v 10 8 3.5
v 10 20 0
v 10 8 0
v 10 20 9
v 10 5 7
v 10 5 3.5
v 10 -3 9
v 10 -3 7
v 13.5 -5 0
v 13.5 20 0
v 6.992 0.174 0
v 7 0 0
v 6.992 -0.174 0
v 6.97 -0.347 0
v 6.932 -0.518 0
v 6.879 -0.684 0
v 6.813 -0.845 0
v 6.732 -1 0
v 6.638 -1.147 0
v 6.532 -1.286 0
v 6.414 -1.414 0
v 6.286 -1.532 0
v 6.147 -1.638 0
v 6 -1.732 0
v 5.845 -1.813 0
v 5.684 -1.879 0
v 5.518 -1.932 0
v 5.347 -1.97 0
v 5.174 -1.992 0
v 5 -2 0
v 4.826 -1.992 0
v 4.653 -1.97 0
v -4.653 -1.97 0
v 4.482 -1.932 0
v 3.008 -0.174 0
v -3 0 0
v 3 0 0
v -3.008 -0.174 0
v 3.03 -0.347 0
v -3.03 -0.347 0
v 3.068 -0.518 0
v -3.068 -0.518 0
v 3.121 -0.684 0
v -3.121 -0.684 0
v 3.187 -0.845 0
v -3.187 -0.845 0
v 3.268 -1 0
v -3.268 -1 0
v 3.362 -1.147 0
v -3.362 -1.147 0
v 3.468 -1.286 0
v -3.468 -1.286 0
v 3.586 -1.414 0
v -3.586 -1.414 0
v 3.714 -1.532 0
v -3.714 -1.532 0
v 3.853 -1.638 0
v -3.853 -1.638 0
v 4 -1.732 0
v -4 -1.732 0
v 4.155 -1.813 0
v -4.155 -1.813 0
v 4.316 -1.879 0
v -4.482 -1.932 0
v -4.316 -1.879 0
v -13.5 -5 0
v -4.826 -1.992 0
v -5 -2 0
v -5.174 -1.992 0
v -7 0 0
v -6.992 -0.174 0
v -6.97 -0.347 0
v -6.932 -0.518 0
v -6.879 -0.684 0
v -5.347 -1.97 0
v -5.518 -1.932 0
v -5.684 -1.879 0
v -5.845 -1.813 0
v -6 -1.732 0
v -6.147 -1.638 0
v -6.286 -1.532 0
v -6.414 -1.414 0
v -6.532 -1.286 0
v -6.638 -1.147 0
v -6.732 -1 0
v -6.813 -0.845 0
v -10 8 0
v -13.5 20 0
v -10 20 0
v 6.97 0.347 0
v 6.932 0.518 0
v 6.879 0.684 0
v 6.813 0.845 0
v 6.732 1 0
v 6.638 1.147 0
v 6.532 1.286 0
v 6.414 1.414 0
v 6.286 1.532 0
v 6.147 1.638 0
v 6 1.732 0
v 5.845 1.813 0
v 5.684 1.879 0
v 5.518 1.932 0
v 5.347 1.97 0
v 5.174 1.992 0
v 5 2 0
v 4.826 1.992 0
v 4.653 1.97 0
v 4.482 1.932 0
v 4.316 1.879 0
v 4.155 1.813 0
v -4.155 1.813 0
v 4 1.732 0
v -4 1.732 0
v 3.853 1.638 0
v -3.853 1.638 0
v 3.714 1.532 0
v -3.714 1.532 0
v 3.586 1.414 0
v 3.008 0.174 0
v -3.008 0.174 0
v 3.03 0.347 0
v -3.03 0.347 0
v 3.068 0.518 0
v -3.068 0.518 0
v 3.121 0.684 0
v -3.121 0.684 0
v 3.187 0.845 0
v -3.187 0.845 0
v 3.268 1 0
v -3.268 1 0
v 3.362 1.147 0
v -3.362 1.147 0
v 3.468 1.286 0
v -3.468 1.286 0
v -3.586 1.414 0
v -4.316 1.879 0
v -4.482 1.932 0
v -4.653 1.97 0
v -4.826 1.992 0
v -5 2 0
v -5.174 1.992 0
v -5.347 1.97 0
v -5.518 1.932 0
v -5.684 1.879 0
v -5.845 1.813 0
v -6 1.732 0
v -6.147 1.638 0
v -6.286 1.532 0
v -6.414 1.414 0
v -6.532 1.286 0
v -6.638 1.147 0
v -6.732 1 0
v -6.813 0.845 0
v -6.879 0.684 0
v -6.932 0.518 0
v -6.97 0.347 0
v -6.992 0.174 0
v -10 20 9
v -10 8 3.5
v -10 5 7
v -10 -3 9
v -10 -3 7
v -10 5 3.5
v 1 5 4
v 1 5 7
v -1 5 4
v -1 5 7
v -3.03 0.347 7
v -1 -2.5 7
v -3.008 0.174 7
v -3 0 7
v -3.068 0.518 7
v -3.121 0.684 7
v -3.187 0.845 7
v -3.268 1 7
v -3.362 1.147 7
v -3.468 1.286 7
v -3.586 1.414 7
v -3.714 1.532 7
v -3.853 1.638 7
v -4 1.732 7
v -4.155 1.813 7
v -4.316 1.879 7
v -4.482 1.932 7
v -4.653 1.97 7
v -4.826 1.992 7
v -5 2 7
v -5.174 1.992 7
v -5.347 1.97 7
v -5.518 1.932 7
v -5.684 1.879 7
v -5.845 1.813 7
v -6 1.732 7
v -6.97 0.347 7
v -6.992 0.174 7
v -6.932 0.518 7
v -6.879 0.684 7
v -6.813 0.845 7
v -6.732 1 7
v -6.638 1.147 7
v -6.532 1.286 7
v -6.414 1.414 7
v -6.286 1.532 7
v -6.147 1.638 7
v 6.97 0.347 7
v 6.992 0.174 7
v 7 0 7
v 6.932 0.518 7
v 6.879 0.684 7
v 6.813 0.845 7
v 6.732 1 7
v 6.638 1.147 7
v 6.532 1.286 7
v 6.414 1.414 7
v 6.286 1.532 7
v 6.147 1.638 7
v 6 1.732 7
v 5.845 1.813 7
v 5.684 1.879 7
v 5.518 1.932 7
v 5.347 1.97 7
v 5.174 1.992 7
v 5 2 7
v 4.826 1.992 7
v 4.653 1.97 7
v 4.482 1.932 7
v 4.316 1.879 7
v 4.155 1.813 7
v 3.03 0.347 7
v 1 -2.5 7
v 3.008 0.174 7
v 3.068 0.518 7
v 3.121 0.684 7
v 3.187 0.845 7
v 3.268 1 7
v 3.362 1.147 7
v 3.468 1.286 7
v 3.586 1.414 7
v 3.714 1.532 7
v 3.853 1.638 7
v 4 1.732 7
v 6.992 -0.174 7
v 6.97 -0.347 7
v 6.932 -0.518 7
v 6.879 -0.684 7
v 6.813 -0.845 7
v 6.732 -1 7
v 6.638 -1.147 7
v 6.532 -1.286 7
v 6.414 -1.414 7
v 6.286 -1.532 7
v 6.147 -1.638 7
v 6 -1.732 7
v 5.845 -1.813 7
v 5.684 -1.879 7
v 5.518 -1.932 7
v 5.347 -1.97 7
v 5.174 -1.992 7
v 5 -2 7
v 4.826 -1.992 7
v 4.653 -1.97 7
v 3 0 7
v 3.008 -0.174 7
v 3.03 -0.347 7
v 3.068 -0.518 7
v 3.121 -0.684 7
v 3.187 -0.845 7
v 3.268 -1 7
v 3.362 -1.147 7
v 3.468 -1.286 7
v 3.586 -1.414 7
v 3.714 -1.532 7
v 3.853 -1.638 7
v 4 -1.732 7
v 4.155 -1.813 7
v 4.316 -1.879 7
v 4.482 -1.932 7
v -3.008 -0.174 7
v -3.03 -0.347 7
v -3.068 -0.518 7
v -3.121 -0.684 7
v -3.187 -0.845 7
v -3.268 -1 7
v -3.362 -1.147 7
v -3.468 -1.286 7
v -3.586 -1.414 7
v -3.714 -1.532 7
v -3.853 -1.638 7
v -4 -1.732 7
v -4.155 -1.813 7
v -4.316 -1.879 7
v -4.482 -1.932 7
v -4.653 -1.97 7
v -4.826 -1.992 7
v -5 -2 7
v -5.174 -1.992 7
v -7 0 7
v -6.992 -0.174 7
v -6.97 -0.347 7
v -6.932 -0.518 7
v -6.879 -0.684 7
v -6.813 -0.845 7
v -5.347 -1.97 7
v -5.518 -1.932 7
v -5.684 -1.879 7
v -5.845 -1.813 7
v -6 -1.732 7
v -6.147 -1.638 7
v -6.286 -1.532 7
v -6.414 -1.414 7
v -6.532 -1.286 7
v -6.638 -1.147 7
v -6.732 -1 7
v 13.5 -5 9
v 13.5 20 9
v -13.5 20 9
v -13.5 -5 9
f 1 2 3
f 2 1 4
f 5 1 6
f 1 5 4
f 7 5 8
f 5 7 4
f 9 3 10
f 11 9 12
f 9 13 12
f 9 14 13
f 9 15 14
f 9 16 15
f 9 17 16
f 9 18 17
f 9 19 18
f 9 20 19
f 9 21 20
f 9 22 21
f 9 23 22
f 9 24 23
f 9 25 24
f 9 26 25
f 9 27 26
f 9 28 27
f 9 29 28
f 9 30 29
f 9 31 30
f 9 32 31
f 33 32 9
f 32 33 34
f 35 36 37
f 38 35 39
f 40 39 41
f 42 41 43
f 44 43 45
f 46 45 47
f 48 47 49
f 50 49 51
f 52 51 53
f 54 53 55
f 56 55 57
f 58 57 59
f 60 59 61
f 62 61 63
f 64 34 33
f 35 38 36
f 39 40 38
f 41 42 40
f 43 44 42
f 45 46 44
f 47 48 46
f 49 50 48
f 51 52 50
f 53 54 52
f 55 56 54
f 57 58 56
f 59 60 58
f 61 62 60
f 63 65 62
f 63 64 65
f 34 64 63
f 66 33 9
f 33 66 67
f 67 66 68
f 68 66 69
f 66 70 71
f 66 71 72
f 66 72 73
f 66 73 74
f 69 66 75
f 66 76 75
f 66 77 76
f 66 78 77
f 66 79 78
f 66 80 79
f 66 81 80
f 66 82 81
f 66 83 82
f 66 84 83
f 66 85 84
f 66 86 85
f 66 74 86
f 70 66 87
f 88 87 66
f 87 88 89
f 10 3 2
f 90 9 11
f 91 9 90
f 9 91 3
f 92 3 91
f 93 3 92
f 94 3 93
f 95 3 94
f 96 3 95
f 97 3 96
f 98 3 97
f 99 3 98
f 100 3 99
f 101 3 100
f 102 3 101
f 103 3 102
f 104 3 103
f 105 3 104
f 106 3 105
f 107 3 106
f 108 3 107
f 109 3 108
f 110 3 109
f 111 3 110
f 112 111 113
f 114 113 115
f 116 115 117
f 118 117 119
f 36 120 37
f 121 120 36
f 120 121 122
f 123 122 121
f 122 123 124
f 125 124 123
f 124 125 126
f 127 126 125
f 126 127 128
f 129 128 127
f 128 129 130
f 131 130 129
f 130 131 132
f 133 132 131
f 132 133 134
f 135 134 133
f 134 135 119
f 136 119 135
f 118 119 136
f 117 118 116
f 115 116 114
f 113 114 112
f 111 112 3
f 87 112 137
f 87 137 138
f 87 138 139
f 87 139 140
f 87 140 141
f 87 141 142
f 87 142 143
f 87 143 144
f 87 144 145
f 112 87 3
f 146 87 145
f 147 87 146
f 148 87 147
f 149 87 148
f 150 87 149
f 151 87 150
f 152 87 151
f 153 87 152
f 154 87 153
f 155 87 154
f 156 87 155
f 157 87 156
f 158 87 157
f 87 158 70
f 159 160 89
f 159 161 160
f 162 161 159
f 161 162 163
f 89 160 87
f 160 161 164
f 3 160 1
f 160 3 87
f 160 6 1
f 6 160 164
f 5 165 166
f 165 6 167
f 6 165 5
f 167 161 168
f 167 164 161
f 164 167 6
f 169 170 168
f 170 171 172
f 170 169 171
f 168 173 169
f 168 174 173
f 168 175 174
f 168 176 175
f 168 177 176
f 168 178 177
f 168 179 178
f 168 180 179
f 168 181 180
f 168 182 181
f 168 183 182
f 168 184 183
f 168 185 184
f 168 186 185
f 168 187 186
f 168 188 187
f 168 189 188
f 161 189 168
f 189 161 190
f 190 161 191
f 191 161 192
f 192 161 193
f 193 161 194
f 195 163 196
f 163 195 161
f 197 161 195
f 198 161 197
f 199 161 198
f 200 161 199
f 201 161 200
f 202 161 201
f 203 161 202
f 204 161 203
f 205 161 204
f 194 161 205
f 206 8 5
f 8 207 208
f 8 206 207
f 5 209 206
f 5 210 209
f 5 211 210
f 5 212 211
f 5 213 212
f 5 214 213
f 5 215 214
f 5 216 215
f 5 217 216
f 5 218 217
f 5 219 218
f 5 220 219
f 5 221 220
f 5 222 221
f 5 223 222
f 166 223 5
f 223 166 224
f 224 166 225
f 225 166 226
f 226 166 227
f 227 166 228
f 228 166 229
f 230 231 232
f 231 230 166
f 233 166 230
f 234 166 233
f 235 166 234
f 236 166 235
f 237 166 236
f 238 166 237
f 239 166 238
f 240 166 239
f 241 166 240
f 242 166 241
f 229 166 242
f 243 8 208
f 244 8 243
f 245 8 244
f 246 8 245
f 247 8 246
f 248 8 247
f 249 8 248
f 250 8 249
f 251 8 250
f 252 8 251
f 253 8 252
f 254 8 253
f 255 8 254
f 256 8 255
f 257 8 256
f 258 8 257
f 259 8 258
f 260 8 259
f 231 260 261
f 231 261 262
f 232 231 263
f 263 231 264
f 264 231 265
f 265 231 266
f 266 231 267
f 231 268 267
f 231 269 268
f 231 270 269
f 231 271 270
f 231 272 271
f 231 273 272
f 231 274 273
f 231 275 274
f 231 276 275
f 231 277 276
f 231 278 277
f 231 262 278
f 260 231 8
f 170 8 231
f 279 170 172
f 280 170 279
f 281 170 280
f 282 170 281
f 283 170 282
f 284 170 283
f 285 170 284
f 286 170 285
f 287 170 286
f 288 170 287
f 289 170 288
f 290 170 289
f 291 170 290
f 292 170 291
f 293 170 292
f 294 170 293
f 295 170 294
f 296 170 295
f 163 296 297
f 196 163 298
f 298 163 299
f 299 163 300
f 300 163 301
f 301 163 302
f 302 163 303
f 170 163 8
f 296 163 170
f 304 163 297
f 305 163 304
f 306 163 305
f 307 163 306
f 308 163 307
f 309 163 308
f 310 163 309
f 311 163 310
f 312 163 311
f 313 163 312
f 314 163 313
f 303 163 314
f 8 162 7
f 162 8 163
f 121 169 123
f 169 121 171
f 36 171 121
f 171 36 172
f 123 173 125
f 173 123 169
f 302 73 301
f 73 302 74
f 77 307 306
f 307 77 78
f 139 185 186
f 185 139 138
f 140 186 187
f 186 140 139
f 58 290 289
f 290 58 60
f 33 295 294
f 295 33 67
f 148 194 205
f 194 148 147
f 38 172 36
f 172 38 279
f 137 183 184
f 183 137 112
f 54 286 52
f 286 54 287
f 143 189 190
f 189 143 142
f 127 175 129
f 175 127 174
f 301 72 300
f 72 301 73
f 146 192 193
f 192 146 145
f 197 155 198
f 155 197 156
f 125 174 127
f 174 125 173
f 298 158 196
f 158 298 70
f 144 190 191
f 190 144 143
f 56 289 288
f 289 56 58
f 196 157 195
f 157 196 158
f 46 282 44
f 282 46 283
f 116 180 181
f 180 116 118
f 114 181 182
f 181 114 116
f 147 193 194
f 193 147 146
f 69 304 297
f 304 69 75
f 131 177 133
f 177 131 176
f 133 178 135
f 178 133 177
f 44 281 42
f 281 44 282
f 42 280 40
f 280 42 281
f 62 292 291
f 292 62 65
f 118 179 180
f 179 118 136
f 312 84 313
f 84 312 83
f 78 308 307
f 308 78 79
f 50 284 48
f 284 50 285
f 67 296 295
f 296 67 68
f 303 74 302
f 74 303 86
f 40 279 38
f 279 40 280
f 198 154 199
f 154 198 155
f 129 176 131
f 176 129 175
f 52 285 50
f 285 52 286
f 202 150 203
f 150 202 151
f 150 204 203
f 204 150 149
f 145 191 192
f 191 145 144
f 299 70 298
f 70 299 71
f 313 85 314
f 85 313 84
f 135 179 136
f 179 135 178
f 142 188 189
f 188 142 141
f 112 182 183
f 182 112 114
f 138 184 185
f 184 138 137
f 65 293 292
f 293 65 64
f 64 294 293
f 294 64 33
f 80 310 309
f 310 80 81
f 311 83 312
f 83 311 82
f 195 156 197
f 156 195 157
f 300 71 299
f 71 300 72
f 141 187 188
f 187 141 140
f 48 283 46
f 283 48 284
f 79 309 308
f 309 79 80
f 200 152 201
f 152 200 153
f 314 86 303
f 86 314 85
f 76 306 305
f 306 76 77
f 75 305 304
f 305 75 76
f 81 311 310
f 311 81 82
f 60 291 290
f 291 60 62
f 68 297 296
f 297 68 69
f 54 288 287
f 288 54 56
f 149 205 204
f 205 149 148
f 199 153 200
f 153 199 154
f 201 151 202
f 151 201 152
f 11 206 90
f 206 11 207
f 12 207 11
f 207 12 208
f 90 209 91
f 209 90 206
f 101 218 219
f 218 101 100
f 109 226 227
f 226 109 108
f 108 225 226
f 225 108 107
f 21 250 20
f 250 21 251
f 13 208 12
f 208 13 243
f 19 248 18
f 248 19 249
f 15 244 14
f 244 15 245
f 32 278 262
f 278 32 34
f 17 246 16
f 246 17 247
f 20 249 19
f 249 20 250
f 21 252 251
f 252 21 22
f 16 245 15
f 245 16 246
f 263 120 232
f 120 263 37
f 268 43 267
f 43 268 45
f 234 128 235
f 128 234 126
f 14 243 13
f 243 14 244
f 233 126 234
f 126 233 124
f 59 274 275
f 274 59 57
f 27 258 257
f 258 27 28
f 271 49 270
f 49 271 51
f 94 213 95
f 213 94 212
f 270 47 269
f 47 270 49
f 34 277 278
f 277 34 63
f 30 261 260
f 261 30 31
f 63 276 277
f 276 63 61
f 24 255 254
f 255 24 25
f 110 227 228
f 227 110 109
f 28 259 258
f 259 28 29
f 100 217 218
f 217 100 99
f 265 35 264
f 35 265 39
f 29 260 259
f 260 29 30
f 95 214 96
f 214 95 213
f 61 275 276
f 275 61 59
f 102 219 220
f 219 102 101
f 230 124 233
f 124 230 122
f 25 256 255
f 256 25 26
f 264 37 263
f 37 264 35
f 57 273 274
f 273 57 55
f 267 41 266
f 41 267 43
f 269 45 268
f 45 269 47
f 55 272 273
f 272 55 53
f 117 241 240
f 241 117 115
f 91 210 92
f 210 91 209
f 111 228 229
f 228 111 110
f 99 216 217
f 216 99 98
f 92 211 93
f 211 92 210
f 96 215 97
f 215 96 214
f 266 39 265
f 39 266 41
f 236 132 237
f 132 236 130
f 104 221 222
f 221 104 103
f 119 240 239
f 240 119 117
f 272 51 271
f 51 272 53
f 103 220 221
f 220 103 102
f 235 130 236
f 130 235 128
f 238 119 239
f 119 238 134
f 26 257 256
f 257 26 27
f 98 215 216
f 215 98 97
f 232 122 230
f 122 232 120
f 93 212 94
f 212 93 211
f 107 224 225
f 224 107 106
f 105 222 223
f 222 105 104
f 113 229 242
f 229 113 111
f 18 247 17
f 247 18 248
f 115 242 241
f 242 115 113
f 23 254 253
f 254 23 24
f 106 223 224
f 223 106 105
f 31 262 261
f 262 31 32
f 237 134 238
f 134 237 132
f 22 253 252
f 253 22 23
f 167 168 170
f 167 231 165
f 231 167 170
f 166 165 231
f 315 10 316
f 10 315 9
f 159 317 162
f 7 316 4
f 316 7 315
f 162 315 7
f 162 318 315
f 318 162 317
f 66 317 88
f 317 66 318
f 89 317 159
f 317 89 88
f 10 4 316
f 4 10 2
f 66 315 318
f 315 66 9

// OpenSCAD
HolderOffset = 5;
HolderWidth = 27;
HolderLength = 20;
HolderHeight = 9;


HoleRadius = 2;
$fn = 72;

ServoWidth = 20;
ServoBaseOffset=8;
ServoBaseLength=36;
ServoBaseThickness = 3.5;

ServoMiddleOffset=5;
ServoMiddleLength=38;
ServoMiddleThickness = 3.5;
ServoBodyHeight = 43;

ServoPlateOffset = 3;
ServoPlateLength=48;
ServoPlateThickness = 3;

FarScrewOffset=48;

WedgeX = 2.5;
WedgeY = 3;

//Servo();



difference() {
    translate([-HolderWidth/2,-HolderOffset,0])
        cube([HolderWidth,HolderOffset+HolderLength,HolderHeight]);
    Servo();
}

module Servo() {
    union () {
        translate([-ServoWidth/2,ServoBaseOffset, 0])
        cube([ServoWidth,ServoBaseLength,ServoBaseThickness+1]);

        translate([-ServoWidth/2,ServoMiddleOffset, ServoBaseThickness])
        cube([ServoWidth,ServoMiddleLength,ServoBodyHeight]);

        translate([-ServoWidth/2,-ServoPlateOffset,ServoBaseThickness+ServoMiddleThickness])
        cube([ServoWidth,ServoPlateLength+ServoPlateOffset*2,
              ServoBodyHeight]);
        
        translate([-5,0,0])
            cylinder(r=2,h=ServoBodyHeight);
        translate([5,0,0])
            cylinder(r=2,h=ServoBodyHeight);
        translate([-5,FarScrewOffset,0])
            cylinder(r=2,h=ServoBodyHeight);
        translate([5,FarScrewOffset,0])
            cylinder(r=2,h=ServoBodyHeight);
        translate([0,0,ServoBaseThickness+ServoMiddleThickness])
            rotate([0,90,0])
                translate([0,0,-1])
                    linear_extrude(height=2)
                    polygon([[0,-WedgeX],
                             [WedgeY,ServoMiddleOffset],
                             [0,5]]);
        translate([0,ServoMiddleLength+10,ServoBaseThickness+ServoMiddleThickness])         
            rotate([0,0,180])               
            rotate([0,90,0])
                translate([0,0,-1])
                    linear_extrude(height=2)
                    polygon([[0,-WedgeX],
                             [WedgeY,ServoMiddleOffset],
                             [0,5]]);

    }
}

/*union() {
    translate([-HolderWidth/2,-ServoOverhang,0])
        cube([HolderWidth, ServoOverhang+ServoOffset1, 3]);
    difference() {
        union () {
            translate([-HolderWidth/2, HolderOffset-ServoOverhang, 0])
                cube([HolderWidth, HolderLength+ServoOverhang,
                      HolderHeight]);
        }
        
        union () {
            translate([-ServoWidth/2, ServoOffset1, -1])
                cube([ServoWidth, ServoLength, HolderHeight+2]);
            
            translate([-ServoWidth/2, ServoOffset2, 3])
                cube([ServoWidth, ServoLength, 5]);

            translate([-ServoWidth/2, ServoOffset3, 8])
                cube([ServoWidth, ServoLength, HolderHeight+2]);
            translate([0,0,16])
                rotate([-20,0,0])
                    cube([2,20,20], center=true);

            translate([-5,0,-1])
                cylinder(r=2,h=10);
            translate([5,0,-1])
                cylinder(r=2,h=10);
            
            translate([-HolderWidth/2-1,0,14])
            rotate([0,90,0])
            cylinder(r=2,h=HolderWidth+2);
            
            
        }
        
    }
}
*/
